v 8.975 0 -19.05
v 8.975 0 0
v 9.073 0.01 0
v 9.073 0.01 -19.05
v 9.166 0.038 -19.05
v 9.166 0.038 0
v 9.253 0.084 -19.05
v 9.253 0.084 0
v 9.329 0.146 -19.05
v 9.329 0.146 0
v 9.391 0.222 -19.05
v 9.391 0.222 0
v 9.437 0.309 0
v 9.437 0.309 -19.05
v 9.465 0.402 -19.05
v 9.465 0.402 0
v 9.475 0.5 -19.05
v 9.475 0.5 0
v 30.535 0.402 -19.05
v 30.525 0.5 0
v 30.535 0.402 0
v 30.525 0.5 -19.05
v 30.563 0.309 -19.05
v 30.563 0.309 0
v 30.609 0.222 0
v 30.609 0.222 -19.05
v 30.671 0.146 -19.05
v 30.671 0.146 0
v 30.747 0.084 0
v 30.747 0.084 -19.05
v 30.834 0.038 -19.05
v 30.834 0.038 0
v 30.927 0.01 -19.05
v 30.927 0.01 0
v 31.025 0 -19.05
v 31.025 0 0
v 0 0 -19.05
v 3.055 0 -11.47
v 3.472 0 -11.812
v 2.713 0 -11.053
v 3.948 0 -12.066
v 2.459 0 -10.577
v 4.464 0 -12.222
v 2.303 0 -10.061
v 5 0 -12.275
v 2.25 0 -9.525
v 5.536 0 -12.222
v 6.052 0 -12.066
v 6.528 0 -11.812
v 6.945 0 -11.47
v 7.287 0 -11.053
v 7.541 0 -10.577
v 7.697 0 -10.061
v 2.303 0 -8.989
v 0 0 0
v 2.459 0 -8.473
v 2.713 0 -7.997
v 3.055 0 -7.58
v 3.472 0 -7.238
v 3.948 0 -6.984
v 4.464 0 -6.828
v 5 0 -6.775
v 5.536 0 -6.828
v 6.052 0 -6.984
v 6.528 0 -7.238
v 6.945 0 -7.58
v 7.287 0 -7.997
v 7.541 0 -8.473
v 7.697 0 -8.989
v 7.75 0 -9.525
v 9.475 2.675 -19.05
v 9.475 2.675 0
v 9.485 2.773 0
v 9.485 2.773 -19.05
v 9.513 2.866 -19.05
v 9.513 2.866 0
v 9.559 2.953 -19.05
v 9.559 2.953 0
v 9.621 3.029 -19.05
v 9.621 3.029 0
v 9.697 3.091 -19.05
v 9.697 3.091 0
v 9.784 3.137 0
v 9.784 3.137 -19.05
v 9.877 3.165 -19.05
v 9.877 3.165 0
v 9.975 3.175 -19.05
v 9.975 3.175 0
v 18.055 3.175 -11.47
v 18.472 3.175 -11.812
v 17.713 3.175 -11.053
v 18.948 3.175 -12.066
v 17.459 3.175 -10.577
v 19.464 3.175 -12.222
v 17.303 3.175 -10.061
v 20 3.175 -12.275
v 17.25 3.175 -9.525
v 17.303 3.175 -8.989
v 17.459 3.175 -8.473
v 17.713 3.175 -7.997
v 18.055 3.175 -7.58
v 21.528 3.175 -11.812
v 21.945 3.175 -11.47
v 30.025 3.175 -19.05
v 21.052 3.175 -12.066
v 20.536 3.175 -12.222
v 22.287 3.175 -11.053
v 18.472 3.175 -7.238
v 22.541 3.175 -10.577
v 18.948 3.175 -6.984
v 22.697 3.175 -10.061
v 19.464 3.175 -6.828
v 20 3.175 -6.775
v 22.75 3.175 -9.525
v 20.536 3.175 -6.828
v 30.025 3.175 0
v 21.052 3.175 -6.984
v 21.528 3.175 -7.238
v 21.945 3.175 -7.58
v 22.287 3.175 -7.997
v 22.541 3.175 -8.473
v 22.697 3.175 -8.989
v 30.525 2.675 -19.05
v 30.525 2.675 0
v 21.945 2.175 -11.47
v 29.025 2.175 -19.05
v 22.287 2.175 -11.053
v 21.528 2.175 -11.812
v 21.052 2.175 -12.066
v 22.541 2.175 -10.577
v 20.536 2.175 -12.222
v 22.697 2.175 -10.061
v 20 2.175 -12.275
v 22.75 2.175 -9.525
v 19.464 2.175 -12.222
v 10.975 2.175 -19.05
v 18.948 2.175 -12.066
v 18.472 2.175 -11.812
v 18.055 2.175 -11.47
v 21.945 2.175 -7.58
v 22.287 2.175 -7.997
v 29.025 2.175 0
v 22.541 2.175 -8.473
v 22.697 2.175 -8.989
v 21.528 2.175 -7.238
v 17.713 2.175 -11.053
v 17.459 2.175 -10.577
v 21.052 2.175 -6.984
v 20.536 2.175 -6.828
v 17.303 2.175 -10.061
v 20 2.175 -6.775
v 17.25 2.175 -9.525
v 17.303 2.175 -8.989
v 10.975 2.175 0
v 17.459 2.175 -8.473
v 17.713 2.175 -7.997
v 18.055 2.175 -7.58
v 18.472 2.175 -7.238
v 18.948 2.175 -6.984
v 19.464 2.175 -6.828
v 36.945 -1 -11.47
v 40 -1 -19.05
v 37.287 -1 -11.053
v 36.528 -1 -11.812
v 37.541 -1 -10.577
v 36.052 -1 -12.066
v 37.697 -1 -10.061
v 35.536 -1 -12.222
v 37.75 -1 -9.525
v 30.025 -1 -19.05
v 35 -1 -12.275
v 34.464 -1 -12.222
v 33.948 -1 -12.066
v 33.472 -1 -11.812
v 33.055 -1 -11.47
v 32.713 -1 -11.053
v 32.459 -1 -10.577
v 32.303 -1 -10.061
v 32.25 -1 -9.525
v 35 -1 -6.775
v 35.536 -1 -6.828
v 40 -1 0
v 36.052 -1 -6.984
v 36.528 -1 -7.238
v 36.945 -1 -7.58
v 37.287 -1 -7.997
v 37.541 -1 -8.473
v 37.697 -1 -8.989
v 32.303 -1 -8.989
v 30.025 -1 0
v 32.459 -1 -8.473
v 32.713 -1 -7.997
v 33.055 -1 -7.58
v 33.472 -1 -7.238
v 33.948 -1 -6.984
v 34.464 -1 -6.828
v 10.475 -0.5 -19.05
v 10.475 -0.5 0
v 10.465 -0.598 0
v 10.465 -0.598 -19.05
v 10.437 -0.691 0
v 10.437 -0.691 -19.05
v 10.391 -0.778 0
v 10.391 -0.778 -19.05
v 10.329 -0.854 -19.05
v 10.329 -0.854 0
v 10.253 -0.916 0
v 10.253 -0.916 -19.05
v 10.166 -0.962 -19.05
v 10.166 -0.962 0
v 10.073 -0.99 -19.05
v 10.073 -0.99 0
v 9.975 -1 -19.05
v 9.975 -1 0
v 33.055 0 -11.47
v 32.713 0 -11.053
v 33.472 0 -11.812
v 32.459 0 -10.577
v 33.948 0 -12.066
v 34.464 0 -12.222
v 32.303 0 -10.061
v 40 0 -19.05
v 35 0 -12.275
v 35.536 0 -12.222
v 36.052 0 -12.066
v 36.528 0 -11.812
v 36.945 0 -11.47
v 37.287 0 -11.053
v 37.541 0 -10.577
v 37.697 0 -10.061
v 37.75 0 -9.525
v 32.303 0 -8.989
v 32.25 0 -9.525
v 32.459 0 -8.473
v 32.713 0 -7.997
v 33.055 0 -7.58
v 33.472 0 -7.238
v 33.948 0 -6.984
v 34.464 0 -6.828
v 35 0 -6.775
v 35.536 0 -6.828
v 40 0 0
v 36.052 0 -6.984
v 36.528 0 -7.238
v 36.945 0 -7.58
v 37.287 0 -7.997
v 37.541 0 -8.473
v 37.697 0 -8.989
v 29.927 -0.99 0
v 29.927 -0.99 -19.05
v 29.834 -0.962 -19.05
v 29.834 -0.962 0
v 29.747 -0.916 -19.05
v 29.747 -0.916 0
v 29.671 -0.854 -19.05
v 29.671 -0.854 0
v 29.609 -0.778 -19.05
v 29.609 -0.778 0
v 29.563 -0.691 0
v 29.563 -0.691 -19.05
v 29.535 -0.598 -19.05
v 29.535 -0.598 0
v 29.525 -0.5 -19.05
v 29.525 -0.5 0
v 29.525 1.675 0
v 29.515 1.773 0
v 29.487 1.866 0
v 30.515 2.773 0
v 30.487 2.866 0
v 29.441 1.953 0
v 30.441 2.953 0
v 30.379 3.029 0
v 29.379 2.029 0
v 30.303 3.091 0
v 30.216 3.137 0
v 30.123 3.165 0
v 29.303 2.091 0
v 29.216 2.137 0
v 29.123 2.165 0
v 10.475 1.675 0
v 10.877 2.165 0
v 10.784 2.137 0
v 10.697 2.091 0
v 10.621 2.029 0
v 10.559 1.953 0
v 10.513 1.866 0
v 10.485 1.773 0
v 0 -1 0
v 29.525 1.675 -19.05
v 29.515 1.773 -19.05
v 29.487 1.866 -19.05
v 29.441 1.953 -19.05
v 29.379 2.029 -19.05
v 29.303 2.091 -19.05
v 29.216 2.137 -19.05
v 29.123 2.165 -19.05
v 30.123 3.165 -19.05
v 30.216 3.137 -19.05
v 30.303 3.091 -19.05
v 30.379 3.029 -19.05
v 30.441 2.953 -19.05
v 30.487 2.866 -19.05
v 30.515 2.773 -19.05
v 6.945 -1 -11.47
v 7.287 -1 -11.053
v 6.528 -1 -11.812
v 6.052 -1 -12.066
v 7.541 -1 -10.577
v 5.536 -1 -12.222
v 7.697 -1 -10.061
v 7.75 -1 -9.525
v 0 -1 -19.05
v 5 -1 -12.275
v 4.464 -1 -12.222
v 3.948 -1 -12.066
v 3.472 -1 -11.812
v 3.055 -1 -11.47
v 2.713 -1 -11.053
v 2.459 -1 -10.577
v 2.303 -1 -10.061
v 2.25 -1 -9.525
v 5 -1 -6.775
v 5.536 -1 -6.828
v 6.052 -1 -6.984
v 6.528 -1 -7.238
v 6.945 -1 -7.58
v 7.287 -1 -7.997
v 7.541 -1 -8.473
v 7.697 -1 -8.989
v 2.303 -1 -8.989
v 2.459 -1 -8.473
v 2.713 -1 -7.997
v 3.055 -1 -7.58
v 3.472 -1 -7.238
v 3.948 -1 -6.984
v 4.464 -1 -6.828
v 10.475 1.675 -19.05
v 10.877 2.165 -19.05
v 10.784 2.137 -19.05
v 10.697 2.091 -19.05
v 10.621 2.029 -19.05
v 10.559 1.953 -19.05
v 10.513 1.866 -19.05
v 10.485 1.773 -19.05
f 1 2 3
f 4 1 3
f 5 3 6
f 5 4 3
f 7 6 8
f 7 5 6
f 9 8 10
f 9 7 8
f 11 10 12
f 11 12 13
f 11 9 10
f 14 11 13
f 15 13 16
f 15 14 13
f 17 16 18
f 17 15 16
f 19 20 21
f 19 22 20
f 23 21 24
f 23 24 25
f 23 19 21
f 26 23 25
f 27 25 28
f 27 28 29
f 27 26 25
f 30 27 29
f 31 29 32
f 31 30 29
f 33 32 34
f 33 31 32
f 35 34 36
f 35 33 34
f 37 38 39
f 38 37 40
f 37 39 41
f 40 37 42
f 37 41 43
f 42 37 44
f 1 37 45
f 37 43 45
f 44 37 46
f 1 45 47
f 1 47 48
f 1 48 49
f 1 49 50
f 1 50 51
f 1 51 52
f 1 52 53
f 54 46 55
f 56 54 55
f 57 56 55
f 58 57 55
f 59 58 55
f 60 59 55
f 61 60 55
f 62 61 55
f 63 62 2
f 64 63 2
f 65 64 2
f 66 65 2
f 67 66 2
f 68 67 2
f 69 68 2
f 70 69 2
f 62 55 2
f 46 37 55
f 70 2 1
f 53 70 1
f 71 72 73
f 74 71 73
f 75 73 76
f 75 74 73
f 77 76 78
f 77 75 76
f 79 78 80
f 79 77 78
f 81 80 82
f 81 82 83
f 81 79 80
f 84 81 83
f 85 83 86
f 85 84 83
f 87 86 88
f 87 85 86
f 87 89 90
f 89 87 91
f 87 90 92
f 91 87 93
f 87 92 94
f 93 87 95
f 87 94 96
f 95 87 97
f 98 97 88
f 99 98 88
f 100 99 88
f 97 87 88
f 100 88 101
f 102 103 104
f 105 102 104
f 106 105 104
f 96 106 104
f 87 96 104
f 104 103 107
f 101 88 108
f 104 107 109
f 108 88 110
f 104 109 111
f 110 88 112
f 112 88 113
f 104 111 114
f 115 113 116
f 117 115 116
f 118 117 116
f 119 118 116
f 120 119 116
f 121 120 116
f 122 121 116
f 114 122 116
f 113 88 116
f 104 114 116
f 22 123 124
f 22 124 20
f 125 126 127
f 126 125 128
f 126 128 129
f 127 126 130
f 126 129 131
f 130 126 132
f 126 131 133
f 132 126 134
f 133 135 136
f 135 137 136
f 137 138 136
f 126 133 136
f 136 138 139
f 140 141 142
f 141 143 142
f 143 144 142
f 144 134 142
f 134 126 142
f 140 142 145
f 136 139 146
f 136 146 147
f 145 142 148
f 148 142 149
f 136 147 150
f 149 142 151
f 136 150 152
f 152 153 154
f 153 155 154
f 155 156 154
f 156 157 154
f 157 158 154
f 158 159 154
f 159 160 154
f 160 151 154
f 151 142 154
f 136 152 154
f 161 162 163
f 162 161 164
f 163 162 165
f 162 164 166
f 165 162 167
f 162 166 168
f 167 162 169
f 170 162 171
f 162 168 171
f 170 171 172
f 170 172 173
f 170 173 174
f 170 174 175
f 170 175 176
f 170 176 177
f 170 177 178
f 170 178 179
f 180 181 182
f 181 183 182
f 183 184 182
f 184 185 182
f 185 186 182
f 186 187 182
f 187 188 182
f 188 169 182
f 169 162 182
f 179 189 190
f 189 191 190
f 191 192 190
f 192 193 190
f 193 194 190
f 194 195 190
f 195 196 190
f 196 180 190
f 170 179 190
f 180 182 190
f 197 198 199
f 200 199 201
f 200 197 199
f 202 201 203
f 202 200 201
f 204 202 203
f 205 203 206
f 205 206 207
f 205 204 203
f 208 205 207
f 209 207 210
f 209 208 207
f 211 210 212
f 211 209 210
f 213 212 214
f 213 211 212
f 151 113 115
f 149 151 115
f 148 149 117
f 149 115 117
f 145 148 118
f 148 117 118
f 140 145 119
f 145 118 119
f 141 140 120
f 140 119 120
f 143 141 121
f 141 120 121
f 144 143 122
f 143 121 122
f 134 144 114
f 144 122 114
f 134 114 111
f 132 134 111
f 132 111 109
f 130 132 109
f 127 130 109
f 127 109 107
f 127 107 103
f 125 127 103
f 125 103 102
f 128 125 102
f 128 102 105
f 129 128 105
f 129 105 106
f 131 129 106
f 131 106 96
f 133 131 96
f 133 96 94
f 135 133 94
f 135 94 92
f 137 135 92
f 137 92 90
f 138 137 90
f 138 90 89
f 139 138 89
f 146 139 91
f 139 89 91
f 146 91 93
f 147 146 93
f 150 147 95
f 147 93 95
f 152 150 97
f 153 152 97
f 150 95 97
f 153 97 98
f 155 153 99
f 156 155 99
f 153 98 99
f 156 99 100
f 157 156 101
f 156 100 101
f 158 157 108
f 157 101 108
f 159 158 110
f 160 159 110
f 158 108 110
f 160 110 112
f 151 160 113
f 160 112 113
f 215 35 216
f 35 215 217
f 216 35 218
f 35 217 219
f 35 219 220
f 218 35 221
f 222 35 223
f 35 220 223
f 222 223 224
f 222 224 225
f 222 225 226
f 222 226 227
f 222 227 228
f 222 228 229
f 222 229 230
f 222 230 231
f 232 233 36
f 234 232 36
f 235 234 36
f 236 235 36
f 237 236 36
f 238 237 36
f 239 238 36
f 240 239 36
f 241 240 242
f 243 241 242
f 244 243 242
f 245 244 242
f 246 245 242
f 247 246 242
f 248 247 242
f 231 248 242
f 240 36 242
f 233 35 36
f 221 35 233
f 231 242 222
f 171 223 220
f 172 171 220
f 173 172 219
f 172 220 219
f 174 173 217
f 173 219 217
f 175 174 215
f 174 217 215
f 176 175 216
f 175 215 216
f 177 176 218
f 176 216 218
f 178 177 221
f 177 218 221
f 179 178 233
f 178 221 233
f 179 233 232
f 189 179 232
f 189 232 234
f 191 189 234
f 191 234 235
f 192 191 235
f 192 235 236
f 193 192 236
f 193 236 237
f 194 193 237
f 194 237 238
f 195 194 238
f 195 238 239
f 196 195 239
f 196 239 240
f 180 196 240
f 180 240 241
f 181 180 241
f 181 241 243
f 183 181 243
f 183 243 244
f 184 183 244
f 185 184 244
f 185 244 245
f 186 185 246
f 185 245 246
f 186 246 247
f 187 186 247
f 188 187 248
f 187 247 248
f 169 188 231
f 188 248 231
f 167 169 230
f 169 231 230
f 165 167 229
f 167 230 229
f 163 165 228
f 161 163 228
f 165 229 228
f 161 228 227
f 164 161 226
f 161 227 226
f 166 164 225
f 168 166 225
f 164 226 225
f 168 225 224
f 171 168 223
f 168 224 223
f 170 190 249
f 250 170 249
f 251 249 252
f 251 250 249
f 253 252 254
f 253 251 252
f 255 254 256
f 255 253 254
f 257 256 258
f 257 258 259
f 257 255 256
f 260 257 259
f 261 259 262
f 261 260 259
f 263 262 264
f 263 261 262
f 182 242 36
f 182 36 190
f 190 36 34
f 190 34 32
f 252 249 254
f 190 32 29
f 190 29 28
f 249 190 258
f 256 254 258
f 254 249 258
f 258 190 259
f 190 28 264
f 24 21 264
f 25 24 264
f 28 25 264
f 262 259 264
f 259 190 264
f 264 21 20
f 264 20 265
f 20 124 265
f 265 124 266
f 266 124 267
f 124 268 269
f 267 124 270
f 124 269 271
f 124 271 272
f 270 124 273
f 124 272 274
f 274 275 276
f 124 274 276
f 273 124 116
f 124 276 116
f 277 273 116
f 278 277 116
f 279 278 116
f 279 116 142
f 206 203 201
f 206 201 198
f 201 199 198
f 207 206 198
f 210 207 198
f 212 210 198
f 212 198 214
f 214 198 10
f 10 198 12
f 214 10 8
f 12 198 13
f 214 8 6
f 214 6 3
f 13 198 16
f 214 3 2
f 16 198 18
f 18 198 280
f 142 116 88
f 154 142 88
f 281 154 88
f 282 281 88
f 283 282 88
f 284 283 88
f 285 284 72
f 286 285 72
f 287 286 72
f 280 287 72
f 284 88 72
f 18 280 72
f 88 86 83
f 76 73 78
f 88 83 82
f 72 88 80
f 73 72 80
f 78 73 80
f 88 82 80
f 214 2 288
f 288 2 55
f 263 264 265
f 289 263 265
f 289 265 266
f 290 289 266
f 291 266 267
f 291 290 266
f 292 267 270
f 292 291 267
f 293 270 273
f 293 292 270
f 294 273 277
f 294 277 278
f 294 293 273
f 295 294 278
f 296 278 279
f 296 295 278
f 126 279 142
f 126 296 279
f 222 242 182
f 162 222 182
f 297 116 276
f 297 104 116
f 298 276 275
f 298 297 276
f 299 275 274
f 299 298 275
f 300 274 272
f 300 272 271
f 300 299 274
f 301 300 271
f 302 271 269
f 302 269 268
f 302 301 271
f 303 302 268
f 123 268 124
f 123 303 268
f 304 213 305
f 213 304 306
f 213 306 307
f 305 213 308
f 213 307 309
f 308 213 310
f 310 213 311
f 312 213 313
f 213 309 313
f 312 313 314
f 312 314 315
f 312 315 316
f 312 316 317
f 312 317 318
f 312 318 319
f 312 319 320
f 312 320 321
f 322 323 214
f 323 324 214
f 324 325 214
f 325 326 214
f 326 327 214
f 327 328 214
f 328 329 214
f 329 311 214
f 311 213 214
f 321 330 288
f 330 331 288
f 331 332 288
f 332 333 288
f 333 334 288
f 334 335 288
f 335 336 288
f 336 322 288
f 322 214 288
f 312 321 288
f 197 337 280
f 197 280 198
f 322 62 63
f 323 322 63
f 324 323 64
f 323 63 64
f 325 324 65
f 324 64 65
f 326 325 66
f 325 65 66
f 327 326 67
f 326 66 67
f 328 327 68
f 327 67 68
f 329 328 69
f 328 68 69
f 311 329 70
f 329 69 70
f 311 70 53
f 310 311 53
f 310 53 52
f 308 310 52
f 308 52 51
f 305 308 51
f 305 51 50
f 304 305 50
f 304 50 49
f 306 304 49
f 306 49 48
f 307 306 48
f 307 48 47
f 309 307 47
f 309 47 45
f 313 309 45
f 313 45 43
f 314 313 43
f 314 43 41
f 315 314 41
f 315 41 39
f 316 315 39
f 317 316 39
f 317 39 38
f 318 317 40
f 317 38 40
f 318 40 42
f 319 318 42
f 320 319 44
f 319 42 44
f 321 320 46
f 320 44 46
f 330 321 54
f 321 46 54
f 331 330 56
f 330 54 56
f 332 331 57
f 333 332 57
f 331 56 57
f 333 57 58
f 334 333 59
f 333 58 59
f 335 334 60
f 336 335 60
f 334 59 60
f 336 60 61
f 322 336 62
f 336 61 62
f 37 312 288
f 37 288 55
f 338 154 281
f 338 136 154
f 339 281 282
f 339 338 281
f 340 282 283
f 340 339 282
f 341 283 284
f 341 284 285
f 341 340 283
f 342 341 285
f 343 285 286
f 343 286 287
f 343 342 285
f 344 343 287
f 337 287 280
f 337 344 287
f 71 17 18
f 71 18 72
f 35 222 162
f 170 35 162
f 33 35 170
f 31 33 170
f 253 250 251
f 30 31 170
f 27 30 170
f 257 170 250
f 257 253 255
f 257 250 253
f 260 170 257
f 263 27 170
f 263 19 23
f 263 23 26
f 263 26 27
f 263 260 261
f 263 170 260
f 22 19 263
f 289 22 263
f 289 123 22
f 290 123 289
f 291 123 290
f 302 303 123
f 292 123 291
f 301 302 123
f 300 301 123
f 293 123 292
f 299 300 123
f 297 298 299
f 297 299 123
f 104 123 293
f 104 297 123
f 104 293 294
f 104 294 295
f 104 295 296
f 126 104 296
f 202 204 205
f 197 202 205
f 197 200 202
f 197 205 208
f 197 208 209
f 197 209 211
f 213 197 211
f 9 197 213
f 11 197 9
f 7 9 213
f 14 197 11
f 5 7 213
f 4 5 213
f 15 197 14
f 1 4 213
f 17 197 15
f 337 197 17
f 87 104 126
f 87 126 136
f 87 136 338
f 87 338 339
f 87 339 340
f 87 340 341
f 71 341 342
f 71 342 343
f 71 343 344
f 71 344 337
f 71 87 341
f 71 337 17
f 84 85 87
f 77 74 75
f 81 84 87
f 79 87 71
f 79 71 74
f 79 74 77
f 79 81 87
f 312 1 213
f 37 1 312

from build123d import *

# Parameters (mm, degrees)
BOSS_EXTRUDE1_DEPTH = 19.05
FILLET1_R           = 0.5
SKETCH3_R           = 2.75
CUT_EXTRUDE1_DEPTH  = 45.418274674
SKETCH4_R           = 2.75
CUT_EXTRUDE2_DEPTH  = 45.500933979


with BuildPart() as part:
    # Sketch1 → Boss-Extrude1 (new body)
    with BuildSketch(Plane.XY):
        Polygon((0, 0), (9.475, 0), (9.475, 3.175), (30.525, 3.175), (30.525, 0), (40, 0), (40, -1), (29.525, -1), (29.525, 2.175), (10.475, 2.175), (10.475, -1), (0, -1), align=None)
    extrude(amount=-BOSS_EXTRUDE1_DEPTH)

    # Fillet1
    fillet1_edges = [part.edges().sort_by_distance(p)[0] for p in [
        (9.475, 0, -9.525),
        (9.475, 3.175, -9.525),
        (30.525, 3.175, -9.525),
        (30.525, 0, -9.525),
        (29.525, -1, -9.525),
        (29.525, 2.175, -9.525),
        (10.475, 2.175, -9.525),
        (10.475, -1, -9.525),
    ]]
    fillet(fillet1_edges, radius=FILLET1_R)

    # Sketch3 → Cut-Extrude1 (cut, through all)
    with BuildSketch(Plane(origin=(0, 0, 0), x_dir=(1, 0, 0), z_dir=(0, 1, 0))):
        with Locations(Location((5, 9.525, 0), (0, 0, 270))):
            Circle(SKETCH3_R)
        with Locations(Location((35, 9.525, 0), (0, 0, 90))):
            Circle(SKETCH3_R)
    extrude(amount=-CUT_EXTRUDE1_DEPTH, mode=Mode.SUBTRACT)

    # Sketch4 → Cut-Extrude2 (cut, through all)
    with BuildSketch(Plane(origin=(0, 3.175, 0), x_dir=(1, 0, 0), z_dir=(0, 1, 0))):
        with Locations(Location((20, 9.525, 0), (0, 0, 270))):
            Circle(SKETCH4_R)
    extrude(amount=-CUT_EXTRUDE2_DEPTH, mode=Mode.SUBTRACT)


solid = part.part
